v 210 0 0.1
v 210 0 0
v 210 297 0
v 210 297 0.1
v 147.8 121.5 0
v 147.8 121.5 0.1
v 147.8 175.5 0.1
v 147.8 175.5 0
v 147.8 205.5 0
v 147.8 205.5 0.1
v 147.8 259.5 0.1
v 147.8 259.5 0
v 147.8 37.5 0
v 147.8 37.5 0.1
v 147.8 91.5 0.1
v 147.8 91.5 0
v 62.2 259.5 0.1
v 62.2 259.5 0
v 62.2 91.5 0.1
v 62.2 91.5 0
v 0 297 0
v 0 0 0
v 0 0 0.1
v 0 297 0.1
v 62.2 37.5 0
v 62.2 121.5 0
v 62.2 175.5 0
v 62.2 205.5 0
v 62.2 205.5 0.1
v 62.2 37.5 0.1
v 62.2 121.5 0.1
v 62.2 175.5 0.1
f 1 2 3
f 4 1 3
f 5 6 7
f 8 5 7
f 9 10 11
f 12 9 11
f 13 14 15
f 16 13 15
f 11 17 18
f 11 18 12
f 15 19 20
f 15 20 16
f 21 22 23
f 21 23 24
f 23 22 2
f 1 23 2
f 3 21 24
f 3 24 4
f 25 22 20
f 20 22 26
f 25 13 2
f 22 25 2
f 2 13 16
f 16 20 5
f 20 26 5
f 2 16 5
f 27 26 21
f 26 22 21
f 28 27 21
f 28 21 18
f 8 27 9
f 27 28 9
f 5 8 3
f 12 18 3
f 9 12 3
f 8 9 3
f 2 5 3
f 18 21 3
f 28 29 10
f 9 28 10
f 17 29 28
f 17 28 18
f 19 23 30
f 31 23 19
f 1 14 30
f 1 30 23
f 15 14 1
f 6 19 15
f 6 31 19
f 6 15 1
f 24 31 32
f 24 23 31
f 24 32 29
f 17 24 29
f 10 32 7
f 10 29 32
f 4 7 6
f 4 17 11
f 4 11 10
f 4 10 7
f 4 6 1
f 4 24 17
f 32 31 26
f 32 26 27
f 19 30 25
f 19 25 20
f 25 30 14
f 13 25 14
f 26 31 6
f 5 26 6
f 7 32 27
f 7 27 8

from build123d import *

# Parameters (mm, degrees)
SKETCH_1_W             = 210
SKETCH_1_H             = 297
EXTRUDE_1_DEPTH        = 0.1
SKETCH_2_W             = 85.6
SKETCH_2_H             = 54
CUT_EXTRUDE_1_DEPTH    = 8
PATTERN_LINEAR_1_COUNT = 3
PATTERN_LINEAR_1_PITCH = 84


with BuildPart() as part:
    # 草图1 → 凸台-拉伸1 (new body)
    with BuildSketch(Plane.XY):
        with Locations((105, 148.5)):
            Rectangle(SKETCH_1_W, SKETCH_1_H)
    extrude(amount=EXTRUDE_1_DEPTH)

    # 草图2 → 切除-拉伸1 (cut)
    with BuildSketch(Plane.XY.offset(0.1)):
        with Locations((105, 64.5)):
            Rectangle(SKETCH_2_W, SKETCH_2_H)
    cut_extrude_1 = extrude(amount=-CUT_EXTRUDE_1_DEPTH, mode=Mode.SUBTRACT)

    # 阵列(线性)1: 切除-拉伸1 ×3
    with Locations(*[(0, i * PATTERN_LINEAR_1_PITCH, 0) for i in range(1, PATTERN_LINEAR_1_COUNT)]):
        add(cut_extrude_1, mode=Mode.SUBTRACT)


solid = part.part
